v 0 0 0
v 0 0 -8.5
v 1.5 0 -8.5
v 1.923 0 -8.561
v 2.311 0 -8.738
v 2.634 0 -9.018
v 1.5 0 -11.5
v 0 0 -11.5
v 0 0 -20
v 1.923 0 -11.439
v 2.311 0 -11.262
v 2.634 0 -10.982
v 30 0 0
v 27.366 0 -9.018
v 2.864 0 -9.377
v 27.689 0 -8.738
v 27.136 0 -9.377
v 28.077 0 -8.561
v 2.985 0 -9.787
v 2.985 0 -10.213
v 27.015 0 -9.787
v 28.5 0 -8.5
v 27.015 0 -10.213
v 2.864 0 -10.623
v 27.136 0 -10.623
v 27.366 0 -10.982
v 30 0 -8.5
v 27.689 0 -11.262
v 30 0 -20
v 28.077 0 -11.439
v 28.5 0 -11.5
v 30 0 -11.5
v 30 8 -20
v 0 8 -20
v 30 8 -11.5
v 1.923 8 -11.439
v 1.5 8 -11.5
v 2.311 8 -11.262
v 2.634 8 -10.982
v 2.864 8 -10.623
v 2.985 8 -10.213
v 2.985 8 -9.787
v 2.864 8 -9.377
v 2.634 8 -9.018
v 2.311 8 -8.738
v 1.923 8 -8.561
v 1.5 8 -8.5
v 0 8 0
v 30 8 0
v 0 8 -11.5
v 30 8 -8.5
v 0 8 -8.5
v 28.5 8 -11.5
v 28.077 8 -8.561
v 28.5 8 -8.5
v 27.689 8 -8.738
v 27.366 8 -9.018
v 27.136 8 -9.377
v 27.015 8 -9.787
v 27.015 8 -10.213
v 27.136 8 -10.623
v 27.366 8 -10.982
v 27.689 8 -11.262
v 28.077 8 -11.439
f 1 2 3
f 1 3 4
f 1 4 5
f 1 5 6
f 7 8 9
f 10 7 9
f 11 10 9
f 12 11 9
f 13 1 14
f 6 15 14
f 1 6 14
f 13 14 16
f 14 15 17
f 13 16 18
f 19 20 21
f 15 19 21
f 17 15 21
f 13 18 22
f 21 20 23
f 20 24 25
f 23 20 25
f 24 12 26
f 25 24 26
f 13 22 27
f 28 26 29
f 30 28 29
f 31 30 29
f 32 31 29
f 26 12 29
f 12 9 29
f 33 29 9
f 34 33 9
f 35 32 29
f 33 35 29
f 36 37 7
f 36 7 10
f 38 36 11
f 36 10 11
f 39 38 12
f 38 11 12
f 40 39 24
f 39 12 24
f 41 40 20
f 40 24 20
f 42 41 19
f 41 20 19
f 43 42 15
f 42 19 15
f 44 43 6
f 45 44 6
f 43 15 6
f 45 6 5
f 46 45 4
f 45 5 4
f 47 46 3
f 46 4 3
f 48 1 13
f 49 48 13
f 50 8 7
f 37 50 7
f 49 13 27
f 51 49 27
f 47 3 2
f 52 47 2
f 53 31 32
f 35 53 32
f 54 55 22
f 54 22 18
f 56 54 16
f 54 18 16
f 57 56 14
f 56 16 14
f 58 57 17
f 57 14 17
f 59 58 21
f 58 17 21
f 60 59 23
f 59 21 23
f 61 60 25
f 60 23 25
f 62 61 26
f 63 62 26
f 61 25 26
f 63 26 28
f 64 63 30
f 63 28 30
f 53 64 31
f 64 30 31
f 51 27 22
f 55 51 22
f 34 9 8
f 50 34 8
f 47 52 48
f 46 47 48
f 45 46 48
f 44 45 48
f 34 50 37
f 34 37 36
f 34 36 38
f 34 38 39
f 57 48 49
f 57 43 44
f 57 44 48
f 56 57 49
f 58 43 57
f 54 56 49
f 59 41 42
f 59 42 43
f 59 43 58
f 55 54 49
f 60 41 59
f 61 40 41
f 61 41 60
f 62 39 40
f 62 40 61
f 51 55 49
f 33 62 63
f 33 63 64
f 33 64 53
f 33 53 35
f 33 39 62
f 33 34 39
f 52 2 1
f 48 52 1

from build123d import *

# Parameters (mm, degrees)
DODANIE_WYCI_GNI_CIE1_DEPTH = 8


with BuildPart() as part:
    # Szkic1 → Dodanie-wyciągnięcie1 (new body)
    with BuildSketch(Plane(origin=(0, 0, 0), x_dir=(1, 0, 0), z_dir=(0, 1, 0))):
        with BuildLine():
            Line((0, 0), (30, 0))
            Line((30, 0), (30, 8.5))
            Line((30, 8.5), (28.5, 8.5))
            ThreePointArc((28.5, 8.5), (27, 10), (28.5, 11.5))
            Line((28.5, 11.5), (30, 11.5))
            Line((30, 11.5), (30, 20))
            Line((30, 20), (0, 20))
            Line((0, 20), (0, 11.5))
            Line((0, 11.5), (1.5, 11.5))
            ThreePointArc((1.5, 11.5), (3, 10), (1.5, 8.5))
            Line((1.5, 8.5), (0, 8.5))
            Line((0, 8.5), (0, 0))
        make_face()
    extrude(amount=DODANIE_WYCI_GNI_CIE1_DEPTH)


solid = part.part
